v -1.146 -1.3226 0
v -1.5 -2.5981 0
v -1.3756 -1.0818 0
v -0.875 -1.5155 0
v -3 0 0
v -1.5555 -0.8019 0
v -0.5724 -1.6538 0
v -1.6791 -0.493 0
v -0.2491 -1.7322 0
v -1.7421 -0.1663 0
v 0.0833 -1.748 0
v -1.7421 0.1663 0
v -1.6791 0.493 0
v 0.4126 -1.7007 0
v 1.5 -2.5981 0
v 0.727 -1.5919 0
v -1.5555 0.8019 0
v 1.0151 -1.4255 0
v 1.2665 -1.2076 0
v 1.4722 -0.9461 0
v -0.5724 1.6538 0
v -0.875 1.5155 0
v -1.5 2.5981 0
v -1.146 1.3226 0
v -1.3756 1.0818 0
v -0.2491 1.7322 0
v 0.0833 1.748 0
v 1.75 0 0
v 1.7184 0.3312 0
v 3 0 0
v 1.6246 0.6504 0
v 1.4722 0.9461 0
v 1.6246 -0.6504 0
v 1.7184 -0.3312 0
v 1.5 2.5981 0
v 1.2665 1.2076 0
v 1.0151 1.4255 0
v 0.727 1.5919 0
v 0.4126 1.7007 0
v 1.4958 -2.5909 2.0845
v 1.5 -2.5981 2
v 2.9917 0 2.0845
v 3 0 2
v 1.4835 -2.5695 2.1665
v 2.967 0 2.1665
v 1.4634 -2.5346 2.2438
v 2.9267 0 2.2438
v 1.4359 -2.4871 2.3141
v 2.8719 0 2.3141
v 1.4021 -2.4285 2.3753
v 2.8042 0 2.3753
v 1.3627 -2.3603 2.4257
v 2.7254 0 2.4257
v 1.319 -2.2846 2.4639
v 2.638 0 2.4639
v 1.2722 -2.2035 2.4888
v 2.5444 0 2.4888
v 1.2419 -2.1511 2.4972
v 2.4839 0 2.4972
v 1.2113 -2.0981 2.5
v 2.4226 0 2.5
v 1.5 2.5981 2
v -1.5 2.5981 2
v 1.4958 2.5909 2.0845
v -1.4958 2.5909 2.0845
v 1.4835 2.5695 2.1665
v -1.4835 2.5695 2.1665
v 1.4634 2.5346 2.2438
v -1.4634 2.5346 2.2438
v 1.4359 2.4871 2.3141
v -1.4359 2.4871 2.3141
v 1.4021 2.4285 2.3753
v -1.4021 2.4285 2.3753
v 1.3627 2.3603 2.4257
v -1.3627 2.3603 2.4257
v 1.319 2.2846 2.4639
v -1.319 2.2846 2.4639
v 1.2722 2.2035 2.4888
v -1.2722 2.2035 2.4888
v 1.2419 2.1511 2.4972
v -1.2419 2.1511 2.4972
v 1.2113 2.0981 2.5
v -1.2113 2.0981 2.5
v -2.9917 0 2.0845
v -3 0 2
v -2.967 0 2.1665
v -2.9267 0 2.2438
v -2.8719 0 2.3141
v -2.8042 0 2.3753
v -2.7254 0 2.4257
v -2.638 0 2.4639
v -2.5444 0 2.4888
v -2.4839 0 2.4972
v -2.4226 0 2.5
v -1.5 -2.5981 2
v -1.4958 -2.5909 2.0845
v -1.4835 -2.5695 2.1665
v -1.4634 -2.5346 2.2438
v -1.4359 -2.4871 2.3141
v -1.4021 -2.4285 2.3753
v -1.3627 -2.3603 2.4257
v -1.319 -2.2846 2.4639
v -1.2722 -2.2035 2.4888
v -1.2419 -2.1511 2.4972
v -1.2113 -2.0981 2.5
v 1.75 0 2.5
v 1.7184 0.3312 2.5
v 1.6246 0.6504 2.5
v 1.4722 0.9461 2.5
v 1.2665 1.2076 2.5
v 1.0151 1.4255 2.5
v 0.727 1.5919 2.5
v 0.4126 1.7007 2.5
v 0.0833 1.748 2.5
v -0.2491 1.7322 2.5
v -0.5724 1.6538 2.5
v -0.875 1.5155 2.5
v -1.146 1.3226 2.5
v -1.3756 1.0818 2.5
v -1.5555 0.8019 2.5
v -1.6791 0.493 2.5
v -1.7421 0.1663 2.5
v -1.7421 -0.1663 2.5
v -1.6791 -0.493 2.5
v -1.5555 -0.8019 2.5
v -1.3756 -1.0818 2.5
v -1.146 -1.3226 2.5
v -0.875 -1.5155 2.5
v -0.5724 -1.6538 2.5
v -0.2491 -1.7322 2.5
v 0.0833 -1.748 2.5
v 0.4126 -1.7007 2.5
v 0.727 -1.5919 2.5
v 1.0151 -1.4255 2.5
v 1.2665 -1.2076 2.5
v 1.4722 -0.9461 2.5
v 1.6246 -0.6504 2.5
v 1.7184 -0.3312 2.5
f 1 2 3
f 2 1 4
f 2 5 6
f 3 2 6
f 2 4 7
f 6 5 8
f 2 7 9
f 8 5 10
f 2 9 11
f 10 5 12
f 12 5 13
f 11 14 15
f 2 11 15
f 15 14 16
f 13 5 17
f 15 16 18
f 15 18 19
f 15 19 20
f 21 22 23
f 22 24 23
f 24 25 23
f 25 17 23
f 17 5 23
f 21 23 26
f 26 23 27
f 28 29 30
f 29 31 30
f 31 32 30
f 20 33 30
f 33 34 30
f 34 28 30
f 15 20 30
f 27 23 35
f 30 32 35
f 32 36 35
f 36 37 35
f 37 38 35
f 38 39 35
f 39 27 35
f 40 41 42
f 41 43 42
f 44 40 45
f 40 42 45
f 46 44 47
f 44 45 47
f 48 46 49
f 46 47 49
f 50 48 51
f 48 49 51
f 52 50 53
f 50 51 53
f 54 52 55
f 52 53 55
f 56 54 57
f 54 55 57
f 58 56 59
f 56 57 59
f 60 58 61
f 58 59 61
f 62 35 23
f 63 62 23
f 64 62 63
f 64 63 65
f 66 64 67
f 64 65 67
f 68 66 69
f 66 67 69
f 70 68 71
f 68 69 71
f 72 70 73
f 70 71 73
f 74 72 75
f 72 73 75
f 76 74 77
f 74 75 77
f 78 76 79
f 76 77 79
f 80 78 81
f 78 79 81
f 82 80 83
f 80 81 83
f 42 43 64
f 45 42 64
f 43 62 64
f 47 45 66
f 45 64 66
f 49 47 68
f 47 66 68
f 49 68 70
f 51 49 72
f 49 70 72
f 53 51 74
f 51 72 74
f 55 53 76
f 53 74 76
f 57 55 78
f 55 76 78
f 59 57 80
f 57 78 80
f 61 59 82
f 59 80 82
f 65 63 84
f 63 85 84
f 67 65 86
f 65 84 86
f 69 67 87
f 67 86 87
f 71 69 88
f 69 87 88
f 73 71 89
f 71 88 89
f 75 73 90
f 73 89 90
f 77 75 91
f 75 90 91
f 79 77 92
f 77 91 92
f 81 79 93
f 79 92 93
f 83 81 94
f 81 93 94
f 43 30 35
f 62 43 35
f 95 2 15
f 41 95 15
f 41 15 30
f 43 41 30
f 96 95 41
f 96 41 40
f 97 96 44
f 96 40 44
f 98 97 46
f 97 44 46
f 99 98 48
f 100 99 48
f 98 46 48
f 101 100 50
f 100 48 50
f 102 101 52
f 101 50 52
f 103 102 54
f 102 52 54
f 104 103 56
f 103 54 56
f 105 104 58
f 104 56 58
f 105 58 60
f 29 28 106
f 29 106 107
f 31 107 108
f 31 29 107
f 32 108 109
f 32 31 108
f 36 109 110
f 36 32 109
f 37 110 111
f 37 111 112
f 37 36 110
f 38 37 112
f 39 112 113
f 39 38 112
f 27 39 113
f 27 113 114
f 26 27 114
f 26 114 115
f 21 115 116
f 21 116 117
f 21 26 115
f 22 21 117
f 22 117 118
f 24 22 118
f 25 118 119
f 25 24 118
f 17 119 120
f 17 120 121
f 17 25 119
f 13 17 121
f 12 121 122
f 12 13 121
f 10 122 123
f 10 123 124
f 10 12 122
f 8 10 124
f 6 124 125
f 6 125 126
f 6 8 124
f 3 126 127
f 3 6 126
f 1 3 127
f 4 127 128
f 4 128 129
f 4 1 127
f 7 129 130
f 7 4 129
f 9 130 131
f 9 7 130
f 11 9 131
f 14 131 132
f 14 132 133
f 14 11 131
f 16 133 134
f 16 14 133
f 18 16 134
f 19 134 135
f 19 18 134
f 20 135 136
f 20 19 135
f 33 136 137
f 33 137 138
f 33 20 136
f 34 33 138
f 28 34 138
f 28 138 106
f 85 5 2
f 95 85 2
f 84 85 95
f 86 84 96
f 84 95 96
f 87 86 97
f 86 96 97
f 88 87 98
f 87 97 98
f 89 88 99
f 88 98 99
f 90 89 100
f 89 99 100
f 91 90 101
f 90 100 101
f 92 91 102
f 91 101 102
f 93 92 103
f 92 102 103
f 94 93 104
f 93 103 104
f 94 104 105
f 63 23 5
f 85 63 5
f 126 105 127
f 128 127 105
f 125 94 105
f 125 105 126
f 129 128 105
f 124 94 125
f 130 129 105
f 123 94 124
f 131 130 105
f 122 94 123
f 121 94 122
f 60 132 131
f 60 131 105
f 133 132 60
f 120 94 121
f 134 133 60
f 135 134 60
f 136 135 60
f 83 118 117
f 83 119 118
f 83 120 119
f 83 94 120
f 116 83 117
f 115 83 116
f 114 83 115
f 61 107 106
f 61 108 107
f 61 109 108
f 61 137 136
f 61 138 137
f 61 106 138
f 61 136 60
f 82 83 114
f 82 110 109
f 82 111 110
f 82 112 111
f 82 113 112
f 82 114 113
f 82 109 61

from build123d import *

# Parameters (mm, degrees)
SKETCH_1_R      = 1.75
EXTRUDE_1_DEPTH = 2.5
FILLET_1_R      = 0.5


with BuildPart() as part:
    # ｽｹｯﾁ1 → ﾎﾞｽ - 押し出し1 (new body)
    with BuildSketch(Plane.XY):
        Polygon((3, 0), (1.5, 2.598076211), (-1.5, 2.598076211), (-3, 0), (-1.5, -2.598076211), (1.5, -2.598076211), align=None)
        Circle(SKETCH_1_R, mode=Mode.SUBTRACT)
    extrude(amount=EXTRUDE_1_DEPTH)

    # ﾌｨﾚｯﾄ1
    fillet_1_edges = [part.edges().sort_by_distance(p)[0] for p in [
        (0, 2.598076211, 2.5),
        (-2.25, 1.299038106, 2.5),
        (-2.25, -1.299038106, 2.5),
        (0, -2.598076211, 2.5),
        (2.25, -1.299038106, 2.5),
        (2.25, 1.299038106, 2.5),
    ]]
    fillet(fillet_1_edges, radius=FILLET_1_R)


solid = part.part
